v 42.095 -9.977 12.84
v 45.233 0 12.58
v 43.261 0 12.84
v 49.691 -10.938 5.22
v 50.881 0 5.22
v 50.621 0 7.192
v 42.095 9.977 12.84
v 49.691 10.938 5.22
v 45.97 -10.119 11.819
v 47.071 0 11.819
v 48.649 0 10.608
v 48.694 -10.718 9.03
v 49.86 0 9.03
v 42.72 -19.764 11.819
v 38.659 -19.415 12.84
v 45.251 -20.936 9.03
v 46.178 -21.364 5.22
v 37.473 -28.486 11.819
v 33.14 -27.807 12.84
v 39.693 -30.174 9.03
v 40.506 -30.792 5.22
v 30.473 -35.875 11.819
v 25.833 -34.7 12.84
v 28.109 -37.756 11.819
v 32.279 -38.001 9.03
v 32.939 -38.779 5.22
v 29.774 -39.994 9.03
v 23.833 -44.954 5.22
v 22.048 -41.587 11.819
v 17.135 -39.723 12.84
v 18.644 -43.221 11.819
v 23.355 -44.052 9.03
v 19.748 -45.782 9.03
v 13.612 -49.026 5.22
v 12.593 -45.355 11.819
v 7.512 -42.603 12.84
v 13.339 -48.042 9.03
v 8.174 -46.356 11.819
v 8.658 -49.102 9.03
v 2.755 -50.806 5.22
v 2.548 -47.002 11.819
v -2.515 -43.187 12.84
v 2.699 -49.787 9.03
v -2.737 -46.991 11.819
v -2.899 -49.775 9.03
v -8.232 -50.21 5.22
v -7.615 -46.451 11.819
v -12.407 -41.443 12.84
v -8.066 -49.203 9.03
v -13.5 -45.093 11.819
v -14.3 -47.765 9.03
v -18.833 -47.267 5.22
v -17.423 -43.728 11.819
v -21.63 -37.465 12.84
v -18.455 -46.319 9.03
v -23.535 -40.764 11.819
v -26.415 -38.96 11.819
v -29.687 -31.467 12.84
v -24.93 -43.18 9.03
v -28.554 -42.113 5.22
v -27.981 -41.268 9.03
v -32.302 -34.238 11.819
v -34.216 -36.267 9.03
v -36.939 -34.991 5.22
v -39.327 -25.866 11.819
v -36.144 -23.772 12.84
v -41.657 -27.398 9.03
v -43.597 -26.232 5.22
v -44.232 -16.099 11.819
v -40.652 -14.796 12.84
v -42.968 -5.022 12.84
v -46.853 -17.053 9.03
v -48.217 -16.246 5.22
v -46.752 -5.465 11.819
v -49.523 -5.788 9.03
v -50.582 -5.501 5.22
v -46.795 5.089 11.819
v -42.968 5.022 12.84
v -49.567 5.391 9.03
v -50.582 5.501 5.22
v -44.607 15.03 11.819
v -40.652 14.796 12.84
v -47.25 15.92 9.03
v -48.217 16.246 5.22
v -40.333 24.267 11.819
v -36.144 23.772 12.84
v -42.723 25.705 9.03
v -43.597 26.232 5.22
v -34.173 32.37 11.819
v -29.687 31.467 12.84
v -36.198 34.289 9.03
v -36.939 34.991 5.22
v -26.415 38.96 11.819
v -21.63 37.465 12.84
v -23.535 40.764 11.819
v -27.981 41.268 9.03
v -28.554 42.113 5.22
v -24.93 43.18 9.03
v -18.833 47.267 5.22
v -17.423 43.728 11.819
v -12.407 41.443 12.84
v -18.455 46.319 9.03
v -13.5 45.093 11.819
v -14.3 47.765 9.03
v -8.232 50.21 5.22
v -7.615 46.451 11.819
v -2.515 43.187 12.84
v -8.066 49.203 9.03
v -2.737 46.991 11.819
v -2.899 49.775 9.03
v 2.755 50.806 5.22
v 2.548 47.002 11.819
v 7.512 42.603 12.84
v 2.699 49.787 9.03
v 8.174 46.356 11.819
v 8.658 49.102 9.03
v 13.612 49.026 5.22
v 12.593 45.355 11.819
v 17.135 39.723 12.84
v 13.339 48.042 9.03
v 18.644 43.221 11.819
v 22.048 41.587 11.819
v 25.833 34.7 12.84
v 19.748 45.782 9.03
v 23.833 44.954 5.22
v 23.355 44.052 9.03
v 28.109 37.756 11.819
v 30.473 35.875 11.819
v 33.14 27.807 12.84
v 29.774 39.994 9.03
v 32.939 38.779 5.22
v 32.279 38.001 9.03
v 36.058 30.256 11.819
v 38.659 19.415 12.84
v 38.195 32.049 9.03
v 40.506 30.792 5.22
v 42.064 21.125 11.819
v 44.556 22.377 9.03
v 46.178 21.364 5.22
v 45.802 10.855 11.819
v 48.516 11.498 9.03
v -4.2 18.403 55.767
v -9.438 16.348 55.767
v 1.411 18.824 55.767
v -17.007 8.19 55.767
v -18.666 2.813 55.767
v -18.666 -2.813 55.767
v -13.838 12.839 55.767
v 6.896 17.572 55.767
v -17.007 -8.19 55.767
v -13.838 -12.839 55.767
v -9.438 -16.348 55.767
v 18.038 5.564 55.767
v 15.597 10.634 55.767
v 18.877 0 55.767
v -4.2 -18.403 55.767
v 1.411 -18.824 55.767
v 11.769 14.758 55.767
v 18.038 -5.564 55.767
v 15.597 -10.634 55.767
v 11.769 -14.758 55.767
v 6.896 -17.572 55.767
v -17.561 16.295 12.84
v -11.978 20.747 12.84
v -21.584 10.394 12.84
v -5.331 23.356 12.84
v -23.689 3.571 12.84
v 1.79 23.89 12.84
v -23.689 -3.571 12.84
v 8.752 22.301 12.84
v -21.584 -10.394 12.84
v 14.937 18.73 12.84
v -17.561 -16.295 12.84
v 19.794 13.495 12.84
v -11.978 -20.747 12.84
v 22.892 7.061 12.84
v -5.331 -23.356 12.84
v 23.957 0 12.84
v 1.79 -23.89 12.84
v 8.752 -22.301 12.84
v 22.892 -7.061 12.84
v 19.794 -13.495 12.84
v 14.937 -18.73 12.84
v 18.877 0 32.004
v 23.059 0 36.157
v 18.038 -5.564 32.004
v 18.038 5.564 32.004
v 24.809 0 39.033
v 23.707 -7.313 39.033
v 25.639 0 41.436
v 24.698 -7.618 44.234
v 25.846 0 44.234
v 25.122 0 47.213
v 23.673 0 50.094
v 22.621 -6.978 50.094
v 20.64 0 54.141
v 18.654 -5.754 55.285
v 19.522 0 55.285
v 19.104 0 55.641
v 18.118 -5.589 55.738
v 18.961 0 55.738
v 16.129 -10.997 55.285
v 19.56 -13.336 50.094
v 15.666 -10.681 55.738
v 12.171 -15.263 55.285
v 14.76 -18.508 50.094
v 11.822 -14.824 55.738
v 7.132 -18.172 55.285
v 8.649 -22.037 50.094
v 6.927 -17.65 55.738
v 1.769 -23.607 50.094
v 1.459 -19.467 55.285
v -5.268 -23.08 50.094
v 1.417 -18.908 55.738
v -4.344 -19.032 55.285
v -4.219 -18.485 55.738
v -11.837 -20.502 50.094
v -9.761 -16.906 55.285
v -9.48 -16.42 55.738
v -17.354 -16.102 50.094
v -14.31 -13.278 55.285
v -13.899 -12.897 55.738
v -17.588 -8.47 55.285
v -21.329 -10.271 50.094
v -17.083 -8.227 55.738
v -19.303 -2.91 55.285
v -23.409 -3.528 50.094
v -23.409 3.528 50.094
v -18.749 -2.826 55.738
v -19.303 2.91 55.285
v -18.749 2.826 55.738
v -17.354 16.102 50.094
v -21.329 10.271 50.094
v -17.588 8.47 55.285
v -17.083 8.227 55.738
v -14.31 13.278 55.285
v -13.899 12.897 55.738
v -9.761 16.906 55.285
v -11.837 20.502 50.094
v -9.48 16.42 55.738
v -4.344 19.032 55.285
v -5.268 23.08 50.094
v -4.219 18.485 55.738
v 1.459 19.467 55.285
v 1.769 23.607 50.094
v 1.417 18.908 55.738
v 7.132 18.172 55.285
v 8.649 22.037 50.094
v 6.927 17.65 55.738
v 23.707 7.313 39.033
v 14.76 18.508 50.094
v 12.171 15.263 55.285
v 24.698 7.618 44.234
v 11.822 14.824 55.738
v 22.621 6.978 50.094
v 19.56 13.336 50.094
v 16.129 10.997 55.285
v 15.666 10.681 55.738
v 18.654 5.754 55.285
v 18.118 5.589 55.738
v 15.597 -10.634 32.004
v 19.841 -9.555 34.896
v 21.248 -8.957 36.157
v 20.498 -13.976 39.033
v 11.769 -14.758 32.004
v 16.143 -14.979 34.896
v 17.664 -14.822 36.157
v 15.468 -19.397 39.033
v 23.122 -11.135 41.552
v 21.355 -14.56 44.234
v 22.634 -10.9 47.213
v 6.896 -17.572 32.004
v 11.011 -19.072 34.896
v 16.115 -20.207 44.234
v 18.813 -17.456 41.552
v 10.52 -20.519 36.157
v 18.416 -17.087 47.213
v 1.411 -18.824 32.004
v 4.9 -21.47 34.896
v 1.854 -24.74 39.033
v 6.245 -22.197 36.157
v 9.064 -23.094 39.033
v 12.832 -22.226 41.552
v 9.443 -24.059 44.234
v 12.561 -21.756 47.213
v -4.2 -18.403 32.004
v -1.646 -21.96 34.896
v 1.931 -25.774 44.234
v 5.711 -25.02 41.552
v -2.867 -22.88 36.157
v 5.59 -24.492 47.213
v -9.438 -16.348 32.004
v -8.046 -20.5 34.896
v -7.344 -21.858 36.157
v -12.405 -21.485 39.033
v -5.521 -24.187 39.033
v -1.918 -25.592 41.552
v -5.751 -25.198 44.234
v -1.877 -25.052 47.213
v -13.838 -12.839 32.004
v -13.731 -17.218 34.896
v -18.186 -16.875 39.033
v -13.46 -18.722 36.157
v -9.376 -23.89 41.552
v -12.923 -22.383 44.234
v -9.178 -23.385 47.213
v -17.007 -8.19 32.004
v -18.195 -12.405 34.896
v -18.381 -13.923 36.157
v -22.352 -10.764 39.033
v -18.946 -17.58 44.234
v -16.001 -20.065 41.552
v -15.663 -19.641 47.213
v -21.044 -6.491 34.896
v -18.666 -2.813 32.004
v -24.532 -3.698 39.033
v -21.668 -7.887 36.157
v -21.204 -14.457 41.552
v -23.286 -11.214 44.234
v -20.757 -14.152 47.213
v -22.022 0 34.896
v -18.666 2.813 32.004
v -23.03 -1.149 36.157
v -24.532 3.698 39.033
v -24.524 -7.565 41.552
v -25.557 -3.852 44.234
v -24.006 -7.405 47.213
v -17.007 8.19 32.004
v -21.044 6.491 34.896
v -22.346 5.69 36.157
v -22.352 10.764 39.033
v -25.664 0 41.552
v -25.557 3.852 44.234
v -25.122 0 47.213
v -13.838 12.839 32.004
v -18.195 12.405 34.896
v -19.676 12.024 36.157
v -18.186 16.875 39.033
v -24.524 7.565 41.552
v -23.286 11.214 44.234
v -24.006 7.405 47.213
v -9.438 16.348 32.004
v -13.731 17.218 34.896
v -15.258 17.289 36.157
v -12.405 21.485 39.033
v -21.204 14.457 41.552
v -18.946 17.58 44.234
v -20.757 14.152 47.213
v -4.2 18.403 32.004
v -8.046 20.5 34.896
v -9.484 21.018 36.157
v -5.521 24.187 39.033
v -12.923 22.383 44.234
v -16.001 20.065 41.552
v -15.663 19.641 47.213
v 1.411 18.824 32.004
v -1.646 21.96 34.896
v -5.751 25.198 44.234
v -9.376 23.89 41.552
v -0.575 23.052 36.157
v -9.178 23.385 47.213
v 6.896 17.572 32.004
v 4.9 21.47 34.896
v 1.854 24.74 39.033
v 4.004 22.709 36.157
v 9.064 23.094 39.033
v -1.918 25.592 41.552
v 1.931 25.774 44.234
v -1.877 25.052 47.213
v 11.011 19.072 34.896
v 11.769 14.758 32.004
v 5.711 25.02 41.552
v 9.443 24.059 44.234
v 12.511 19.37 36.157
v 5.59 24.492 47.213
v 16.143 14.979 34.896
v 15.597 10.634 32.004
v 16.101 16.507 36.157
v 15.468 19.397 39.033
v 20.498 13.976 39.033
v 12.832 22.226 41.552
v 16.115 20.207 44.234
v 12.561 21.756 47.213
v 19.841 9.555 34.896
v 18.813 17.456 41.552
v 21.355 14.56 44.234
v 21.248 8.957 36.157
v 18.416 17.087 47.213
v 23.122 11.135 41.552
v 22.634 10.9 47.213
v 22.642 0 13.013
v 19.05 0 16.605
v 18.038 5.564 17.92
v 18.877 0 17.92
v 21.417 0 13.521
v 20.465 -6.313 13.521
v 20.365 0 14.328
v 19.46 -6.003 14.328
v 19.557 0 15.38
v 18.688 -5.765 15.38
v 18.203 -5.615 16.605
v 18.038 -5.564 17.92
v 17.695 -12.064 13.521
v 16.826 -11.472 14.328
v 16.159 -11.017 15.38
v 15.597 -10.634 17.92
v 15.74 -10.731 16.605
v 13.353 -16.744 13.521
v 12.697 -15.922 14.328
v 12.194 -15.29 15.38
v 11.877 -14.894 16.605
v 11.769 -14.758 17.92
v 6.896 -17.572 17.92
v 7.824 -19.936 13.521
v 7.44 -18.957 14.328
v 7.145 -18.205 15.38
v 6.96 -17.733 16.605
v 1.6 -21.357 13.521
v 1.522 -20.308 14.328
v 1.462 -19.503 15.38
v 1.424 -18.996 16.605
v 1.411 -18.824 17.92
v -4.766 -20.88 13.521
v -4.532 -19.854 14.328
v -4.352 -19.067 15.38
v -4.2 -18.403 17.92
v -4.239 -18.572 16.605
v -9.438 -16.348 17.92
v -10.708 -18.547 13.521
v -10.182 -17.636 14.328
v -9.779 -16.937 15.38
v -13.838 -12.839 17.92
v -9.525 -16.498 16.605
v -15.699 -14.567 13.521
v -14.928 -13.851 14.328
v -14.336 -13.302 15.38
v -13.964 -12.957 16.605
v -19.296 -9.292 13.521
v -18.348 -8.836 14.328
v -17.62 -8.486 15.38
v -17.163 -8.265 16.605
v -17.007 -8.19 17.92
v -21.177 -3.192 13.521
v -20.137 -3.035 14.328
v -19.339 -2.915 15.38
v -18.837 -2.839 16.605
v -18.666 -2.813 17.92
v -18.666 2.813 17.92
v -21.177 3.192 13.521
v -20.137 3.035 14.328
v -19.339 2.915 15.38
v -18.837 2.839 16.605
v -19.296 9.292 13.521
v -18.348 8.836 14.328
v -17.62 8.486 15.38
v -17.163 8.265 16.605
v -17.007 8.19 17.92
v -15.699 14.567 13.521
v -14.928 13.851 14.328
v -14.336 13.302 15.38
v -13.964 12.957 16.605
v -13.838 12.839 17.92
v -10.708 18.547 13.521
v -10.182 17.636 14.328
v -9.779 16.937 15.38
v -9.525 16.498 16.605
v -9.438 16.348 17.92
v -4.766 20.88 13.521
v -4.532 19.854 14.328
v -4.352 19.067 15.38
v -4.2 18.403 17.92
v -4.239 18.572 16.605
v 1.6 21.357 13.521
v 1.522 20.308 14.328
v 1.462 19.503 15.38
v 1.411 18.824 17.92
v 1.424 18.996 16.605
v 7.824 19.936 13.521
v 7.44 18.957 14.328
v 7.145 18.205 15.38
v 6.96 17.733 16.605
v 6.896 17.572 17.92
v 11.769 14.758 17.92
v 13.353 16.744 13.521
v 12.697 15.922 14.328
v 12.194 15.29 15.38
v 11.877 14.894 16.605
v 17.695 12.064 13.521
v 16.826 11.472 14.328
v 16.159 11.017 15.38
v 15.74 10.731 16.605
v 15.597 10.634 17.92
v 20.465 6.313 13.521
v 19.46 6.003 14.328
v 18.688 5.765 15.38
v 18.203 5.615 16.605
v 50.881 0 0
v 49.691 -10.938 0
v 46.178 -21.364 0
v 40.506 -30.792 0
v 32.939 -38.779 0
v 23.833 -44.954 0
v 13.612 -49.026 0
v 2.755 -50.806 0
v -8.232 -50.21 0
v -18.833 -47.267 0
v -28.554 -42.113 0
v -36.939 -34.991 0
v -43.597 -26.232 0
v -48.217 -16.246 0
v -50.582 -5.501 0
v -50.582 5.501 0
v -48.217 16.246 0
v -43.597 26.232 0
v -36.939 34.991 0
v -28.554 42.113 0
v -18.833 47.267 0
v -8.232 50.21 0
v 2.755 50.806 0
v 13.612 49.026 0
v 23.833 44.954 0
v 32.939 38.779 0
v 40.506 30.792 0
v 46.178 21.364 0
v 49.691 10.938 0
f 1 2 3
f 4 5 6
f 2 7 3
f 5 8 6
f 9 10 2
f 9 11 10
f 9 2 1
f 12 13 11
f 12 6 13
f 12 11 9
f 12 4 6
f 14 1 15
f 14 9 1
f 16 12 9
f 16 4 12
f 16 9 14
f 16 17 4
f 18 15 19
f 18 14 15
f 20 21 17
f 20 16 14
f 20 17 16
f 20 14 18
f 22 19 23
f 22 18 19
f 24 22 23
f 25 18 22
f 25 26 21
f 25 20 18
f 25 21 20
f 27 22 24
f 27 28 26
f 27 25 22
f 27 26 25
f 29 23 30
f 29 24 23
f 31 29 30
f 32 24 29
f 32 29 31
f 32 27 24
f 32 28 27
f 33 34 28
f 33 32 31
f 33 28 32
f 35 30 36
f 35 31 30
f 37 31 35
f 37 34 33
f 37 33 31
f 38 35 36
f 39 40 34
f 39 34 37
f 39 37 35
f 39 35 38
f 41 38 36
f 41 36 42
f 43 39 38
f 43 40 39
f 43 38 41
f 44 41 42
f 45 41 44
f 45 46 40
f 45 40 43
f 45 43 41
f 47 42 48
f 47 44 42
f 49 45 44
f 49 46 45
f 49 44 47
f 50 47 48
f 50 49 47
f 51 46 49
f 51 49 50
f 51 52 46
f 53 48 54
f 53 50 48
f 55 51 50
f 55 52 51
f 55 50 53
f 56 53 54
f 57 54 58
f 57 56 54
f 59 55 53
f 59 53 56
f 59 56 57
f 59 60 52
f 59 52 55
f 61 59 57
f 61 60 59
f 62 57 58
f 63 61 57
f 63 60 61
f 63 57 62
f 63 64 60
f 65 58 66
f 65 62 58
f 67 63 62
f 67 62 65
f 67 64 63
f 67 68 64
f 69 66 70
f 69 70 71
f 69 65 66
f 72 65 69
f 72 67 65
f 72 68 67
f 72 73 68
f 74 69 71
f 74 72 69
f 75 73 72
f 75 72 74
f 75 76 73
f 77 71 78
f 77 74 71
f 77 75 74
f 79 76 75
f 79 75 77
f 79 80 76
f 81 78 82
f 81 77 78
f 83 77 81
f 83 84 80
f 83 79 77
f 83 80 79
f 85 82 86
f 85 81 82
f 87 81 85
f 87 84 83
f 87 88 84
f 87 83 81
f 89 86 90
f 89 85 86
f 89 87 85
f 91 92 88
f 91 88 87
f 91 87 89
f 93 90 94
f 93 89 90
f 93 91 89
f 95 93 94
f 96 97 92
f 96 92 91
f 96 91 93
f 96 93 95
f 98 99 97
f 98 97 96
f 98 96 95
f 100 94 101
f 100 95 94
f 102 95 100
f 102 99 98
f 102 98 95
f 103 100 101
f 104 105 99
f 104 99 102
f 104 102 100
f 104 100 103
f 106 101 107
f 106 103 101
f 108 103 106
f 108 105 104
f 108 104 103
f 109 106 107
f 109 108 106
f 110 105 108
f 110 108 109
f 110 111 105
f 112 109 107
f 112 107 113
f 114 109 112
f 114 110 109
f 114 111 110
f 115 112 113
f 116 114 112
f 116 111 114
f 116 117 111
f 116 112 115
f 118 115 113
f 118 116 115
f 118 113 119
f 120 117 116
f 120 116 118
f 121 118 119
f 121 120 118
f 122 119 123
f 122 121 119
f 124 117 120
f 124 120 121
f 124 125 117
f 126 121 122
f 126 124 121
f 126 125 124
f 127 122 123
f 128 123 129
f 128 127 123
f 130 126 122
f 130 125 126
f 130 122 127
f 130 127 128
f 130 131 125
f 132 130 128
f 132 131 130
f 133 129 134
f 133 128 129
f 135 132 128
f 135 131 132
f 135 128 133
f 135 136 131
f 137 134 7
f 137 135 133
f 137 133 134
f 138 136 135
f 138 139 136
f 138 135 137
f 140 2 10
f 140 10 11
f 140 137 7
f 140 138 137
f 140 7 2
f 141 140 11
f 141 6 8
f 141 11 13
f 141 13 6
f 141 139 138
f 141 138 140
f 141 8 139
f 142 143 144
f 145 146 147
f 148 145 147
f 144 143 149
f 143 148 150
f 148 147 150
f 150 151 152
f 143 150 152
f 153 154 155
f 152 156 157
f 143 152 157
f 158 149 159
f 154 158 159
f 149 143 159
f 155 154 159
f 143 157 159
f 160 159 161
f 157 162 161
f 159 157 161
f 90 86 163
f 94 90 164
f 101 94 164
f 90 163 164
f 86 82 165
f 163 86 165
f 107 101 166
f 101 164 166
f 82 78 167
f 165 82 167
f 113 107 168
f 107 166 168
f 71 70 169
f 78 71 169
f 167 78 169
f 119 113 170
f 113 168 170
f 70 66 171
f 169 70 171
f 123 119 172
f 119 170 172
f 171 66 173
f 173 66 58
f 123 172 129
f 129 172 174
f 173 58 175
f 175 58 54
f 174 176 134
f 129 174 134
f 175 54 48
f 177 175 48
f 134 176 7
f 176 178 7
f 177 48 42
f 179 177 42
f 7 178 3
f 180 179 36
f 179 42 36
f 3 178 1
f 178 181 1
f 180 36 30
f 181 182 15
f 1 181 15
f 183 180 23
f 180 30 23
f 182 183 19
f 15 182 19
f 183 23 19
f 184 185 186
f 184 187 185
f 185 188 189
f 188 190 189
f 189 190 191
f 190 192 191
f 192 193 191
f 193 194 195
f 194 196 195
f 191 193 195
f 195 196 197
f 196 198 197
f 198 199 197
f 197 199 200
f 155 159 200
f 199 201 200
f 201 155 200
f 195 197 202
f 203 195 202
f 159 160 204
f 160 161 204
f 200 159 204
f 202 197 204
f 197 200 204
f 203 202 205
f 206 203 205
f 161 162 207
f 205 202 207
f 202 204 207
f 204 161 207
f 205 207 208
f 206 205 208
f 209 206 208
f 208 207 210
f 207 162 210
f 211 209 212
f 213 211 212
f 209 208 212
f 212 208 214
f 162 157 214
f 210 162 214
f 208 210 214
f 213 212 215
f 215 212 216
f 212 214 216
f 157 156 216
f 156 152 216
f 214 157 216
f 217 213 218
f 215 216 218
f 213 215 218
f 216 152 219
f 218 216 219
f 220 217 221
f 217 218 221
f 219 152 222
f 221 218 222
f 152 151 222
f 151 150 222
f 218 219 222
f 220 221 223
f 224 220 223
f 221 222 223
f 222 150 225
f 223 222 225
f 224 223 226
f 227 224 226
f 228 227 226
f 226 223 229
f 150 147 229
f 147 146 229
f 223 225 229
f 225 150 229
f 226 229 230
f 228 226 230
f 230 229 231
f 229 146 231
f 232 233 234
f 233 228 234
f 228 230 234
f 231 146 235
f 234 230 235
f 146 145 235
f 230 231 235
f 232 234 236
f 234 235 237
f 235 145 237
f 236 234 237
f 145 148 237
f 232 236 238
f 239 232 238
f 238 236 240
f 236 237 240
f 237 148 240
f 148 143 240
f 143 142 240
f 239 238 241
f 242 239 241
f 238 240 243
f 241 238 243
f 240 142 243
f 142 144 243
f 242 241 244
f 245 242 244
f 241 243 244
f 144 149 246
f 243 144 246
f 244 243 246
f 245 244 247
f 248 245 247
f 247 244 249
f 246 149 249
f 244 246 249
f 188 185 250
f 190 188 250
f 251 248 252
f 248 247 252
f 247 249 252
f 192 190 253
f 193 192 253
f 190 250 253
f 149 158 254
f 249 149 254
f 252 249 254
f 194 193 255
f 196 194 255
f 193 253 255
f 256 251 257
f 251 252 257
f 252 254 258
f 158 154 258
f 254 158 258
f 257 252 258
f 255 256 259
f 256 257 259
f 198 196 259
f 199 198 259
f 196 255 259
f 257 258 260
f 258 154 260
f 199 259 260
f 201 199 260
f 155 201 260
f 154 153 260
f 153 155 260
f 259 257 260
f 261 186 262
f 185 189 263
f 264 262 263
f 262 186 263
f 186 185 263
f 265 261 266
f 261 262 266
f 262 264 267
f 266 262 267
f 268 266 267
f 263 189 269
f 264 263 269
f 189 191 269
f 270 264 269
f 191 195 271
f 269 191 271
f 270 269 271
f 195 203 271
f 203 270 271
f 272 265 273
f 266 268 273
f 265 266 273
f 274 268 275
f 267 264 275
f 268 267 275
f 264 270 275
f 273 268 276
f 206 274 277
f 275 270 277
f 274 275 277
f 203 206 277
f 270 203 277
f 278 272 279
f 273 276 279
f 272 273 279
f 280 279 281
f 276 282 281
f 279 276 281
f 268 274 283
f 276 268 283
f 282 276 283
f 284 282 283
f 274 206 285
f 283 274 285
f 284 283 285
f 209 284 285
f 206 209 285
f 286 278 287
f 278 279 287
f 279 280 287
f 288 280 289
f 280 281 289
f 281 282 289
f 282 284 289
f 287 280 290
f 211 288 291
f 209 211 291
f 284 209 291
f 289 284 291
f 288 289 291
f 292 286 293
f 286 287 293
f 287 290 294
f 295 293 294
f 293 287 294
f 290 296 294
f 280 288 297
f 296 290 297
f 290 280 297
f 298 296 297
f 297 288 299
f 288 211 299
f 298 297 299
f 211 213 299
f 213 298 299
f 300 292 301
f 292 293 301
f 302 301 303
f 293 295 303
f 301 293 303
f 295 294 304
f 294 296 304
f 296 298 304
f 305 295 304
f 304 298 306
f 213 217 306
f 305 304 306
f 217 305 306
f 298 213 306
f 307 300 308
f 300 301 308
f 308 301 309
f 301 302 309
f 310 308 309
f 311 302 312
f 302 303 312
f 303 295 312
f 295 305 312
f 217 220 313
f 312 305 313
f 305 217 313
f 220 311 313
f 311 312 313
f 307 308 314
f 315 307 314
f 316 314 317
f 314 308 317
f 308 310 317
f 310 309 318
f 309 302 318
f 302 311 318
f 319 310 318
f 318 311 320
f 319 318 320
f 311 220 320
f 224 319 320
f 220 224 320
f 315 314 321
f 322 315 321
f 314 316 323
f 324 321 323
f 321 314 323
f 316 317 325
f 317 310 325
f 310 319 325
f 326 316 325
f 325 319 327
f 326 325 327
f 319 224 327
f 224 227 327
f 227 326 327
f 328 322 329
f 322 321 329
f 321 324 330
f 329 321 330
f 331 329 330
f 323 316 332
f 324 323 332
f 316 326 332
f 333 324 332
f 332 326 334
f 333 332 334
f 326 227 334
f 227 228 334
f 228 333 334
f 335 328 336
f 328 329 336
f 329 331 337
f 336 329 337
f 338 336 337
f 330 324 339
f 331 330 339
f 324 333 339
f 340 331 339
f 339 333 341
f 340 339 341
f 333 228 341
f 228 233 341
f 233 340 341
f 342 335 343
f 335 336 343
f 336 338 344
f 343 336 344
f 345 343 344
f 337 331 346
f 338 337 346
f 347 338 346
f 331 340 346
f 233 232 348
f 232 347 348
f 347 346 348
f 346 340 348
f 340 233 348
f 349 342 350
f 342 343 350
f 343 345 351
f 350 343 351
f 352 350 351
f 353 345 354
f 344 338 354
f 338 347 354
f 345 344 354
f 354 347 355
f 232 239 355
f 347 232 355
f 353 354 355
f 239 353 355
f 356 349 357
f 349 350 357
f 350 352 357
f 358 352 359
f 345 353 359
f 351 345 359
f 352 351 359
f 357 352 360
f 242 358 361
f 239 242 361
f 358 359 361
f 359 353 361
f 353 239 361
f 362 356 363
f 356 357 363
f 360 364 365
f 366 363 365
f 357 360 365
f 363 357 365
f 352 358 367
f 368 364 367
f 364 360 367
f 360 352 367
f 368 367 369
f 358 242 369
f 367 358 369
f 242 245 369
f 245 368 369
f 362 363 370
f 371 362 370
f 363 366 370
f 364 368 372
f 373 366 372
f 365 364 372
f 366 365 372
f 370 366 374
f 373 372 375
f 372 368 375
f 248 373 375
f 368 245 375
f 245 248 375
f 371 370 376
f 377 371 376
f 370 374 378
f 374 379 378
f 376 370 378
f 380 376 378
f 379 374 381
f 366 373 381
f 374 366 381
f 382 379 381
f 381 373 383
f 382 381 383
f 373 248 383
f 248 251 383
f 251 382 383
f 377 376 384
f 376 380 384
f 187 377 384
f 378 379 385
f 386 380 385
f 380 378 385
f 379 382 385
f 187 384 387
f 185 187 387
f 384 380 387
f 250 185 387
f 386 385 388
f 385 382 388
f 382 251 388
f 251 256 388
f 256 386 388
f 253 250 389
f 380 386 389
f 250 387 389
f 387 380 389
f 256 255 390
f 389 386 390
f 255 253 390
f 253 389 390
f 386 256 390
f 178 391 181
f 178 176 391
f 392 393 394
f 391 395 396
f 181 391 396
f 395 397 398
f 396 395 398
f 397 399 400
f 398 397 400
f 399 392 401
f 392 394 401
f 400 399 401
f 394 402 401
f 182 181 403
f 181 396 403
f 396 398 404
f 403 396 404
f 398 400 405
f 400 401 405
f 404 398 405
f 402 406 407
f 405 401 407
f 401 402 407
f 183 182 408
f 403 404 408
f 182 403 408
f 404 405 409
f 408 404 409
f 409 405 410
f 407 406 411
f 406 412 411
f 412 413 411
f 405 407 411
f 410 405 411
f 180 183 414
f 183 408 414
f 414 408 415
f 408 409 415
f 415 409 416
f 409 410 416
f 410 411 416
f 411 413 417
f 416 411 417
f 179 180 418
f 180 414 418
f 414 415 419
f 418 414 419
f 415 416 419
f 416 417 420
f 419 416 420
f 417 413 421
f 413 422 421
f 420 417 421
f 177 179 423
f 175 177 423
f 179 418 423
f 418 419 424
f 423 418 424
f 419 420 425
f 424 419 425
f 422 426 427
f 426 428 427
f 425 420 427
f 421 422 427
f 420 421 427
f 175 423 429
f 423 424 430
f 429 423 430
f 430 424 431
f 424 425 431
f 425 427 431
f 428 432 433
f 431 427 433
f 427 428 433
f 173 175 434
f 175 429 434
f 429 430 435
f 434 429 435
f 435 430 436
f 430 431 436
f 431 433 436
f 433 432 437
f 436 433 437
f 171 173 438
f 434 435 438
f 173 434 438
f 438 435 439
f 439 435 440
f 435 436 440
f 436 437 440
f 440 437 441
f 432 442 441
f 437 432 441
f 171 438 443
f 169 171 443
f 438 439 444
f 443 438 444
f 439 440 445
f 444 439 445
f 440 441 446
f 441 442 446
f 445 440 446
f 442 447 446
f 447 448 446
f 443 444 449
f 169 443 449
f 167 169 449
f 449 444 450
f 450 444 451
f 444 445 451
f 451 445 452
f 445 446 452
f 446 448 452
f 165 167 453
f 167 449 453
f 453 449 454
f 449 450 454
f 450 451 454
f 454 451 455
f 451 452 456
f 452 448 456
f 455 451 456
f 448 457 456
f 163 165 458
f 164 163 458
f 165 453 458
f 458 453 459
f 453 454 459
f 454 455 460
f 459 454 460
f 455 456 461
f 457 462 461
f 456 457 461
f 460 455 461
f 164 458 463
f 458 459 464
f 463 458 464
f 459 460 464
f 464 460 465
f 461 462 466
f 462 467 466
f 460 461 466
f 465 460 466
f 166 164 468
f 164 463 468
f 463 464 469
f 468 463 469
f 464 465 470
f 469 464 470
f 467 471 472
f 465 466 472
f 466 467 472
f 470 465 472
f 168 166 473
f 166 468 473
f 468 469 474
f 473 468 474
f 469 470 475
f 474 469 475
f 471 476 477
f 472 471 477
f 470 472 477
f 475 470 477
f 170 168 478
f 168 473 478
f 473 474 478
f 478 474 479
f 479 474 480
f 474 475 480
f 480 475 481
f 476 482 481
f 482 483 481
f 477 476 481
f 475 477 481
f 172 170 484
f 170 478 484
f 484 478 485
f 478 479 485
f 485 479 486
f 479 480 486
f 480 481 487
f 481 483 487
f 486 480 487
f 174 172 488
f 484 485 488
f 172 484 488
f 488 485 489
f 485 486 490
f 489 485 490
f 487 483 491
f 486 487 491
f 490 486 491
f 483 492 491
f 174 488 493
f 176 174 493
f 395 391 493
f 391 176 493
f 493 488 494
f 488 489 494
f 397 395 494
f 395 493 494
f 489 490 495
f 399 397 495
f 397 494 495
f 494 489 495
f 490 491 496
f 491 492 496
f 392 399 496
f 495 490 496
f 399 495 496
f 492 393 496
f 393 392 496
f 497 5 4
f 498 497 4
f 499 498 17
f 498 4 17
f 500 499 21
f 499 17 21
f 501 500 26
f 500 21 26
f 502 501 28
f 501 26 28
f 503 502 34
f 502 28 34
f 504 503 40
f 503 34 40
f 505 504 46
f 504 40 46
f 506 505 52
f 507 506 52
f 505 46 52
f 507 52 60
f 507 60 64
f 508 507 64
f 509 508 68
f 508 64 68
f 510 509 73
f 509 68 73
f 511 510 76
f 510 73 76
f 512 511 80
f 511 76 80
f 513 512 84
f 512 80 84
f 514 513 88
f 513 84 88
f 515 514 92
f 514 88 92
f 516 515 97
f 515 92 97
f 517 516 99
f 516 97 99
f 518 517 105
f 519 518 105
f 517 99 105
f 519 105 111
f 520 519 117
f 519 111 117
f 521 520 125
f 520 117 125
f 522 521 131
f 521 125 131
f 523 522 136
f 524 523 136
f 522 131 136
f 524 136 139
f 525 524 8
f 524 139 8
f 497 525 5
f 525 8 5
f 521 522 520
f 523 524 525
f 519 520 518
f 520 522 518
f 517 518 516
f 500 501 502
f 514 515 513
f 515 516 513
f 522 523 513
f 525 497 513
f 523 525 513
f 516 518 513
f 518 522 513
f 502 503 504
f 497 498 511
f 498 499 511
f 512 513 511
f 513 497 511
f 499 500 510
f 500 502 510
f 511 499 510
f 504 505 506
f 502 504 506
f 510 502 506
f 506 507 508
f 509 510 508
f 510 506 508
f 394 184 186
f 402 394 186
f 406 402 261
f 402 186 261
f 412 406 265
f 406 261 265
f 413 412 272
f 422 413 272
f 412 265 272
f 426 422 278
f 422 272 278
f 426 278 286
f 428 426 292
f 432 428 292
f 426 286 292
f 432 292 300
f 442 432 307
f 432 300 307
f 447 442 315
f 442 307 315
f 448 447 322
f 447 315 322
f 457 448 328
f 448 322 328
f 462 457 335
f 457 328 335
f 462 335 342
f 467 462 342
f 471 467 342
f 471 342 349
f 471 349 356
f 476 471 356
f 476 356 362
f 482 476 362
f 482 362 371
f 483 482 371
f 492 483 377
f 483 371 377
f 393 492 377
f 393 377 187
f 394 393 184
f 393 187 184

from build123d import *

# Parameters (mm, degrees)
F2_R     = 5.08
F3_R     = 7.62
F4_R     = 14.2888037355
F5_DEPTH = 25.4


with BuildPart() as f1:
    # F0 (on Front) → F1 (revolve)
    with BuildSketch(Plane.XZ):
        with BuildLine():
            Line((0, 55.7674504817), (0, 0))
            Line((0, 0), (50.8806146681, 0))
            Line((50.8806146681, 0), (50.8806146681, 12.8399282694))
            Line((50.8806146681, 12.8399282694), (18.8766103238, 12.8399282694))
            Line((18.8766103238, 12.8399282694), (18.8766103238, 32.0040024817))
            add(Edge.make_bspline(
                [(18.8766103238, 32.0040024817), (21.8979616755, 34.2451012966), (31.0578233334, 44.0143150598), (19.2667769723, 55.8005396658), (18.8766103238, 55.7674504817)],
                knots=[0, 0, 0, 0, 0.4863492735, 0.9442337123, 0.9442337123, 0.9442337123, 0.9442337123], degree=3))
            Line((18.8766103238, 55.7674504817), (0, 55.7674504817))
        make_face()
    revolve(axis=Axis((0, 0, 27.8837252408), (0, 0, -1)))

    # F2
    f2_edges = [f1.edges().sort_by_distance(p)[0] for p in [
        (-18.87661, 0, 12.839928),
    ]]
    fillet(f2_edges, radius=F2_R)

    # F3
    f3_edges = [f1.edges().sort_by_distance(p)[0] for p in [
        (-50.880615, 0, 12.839928),
    ]]
    fillet(f3_edges, radius=F3_R)

    # F4 (on Top) → F5 (join)
    with BuildSketch(Plane.XY):
        Circle(F4_R)
    extrude(amount=F5_DEPTH)


solid = f1.part
